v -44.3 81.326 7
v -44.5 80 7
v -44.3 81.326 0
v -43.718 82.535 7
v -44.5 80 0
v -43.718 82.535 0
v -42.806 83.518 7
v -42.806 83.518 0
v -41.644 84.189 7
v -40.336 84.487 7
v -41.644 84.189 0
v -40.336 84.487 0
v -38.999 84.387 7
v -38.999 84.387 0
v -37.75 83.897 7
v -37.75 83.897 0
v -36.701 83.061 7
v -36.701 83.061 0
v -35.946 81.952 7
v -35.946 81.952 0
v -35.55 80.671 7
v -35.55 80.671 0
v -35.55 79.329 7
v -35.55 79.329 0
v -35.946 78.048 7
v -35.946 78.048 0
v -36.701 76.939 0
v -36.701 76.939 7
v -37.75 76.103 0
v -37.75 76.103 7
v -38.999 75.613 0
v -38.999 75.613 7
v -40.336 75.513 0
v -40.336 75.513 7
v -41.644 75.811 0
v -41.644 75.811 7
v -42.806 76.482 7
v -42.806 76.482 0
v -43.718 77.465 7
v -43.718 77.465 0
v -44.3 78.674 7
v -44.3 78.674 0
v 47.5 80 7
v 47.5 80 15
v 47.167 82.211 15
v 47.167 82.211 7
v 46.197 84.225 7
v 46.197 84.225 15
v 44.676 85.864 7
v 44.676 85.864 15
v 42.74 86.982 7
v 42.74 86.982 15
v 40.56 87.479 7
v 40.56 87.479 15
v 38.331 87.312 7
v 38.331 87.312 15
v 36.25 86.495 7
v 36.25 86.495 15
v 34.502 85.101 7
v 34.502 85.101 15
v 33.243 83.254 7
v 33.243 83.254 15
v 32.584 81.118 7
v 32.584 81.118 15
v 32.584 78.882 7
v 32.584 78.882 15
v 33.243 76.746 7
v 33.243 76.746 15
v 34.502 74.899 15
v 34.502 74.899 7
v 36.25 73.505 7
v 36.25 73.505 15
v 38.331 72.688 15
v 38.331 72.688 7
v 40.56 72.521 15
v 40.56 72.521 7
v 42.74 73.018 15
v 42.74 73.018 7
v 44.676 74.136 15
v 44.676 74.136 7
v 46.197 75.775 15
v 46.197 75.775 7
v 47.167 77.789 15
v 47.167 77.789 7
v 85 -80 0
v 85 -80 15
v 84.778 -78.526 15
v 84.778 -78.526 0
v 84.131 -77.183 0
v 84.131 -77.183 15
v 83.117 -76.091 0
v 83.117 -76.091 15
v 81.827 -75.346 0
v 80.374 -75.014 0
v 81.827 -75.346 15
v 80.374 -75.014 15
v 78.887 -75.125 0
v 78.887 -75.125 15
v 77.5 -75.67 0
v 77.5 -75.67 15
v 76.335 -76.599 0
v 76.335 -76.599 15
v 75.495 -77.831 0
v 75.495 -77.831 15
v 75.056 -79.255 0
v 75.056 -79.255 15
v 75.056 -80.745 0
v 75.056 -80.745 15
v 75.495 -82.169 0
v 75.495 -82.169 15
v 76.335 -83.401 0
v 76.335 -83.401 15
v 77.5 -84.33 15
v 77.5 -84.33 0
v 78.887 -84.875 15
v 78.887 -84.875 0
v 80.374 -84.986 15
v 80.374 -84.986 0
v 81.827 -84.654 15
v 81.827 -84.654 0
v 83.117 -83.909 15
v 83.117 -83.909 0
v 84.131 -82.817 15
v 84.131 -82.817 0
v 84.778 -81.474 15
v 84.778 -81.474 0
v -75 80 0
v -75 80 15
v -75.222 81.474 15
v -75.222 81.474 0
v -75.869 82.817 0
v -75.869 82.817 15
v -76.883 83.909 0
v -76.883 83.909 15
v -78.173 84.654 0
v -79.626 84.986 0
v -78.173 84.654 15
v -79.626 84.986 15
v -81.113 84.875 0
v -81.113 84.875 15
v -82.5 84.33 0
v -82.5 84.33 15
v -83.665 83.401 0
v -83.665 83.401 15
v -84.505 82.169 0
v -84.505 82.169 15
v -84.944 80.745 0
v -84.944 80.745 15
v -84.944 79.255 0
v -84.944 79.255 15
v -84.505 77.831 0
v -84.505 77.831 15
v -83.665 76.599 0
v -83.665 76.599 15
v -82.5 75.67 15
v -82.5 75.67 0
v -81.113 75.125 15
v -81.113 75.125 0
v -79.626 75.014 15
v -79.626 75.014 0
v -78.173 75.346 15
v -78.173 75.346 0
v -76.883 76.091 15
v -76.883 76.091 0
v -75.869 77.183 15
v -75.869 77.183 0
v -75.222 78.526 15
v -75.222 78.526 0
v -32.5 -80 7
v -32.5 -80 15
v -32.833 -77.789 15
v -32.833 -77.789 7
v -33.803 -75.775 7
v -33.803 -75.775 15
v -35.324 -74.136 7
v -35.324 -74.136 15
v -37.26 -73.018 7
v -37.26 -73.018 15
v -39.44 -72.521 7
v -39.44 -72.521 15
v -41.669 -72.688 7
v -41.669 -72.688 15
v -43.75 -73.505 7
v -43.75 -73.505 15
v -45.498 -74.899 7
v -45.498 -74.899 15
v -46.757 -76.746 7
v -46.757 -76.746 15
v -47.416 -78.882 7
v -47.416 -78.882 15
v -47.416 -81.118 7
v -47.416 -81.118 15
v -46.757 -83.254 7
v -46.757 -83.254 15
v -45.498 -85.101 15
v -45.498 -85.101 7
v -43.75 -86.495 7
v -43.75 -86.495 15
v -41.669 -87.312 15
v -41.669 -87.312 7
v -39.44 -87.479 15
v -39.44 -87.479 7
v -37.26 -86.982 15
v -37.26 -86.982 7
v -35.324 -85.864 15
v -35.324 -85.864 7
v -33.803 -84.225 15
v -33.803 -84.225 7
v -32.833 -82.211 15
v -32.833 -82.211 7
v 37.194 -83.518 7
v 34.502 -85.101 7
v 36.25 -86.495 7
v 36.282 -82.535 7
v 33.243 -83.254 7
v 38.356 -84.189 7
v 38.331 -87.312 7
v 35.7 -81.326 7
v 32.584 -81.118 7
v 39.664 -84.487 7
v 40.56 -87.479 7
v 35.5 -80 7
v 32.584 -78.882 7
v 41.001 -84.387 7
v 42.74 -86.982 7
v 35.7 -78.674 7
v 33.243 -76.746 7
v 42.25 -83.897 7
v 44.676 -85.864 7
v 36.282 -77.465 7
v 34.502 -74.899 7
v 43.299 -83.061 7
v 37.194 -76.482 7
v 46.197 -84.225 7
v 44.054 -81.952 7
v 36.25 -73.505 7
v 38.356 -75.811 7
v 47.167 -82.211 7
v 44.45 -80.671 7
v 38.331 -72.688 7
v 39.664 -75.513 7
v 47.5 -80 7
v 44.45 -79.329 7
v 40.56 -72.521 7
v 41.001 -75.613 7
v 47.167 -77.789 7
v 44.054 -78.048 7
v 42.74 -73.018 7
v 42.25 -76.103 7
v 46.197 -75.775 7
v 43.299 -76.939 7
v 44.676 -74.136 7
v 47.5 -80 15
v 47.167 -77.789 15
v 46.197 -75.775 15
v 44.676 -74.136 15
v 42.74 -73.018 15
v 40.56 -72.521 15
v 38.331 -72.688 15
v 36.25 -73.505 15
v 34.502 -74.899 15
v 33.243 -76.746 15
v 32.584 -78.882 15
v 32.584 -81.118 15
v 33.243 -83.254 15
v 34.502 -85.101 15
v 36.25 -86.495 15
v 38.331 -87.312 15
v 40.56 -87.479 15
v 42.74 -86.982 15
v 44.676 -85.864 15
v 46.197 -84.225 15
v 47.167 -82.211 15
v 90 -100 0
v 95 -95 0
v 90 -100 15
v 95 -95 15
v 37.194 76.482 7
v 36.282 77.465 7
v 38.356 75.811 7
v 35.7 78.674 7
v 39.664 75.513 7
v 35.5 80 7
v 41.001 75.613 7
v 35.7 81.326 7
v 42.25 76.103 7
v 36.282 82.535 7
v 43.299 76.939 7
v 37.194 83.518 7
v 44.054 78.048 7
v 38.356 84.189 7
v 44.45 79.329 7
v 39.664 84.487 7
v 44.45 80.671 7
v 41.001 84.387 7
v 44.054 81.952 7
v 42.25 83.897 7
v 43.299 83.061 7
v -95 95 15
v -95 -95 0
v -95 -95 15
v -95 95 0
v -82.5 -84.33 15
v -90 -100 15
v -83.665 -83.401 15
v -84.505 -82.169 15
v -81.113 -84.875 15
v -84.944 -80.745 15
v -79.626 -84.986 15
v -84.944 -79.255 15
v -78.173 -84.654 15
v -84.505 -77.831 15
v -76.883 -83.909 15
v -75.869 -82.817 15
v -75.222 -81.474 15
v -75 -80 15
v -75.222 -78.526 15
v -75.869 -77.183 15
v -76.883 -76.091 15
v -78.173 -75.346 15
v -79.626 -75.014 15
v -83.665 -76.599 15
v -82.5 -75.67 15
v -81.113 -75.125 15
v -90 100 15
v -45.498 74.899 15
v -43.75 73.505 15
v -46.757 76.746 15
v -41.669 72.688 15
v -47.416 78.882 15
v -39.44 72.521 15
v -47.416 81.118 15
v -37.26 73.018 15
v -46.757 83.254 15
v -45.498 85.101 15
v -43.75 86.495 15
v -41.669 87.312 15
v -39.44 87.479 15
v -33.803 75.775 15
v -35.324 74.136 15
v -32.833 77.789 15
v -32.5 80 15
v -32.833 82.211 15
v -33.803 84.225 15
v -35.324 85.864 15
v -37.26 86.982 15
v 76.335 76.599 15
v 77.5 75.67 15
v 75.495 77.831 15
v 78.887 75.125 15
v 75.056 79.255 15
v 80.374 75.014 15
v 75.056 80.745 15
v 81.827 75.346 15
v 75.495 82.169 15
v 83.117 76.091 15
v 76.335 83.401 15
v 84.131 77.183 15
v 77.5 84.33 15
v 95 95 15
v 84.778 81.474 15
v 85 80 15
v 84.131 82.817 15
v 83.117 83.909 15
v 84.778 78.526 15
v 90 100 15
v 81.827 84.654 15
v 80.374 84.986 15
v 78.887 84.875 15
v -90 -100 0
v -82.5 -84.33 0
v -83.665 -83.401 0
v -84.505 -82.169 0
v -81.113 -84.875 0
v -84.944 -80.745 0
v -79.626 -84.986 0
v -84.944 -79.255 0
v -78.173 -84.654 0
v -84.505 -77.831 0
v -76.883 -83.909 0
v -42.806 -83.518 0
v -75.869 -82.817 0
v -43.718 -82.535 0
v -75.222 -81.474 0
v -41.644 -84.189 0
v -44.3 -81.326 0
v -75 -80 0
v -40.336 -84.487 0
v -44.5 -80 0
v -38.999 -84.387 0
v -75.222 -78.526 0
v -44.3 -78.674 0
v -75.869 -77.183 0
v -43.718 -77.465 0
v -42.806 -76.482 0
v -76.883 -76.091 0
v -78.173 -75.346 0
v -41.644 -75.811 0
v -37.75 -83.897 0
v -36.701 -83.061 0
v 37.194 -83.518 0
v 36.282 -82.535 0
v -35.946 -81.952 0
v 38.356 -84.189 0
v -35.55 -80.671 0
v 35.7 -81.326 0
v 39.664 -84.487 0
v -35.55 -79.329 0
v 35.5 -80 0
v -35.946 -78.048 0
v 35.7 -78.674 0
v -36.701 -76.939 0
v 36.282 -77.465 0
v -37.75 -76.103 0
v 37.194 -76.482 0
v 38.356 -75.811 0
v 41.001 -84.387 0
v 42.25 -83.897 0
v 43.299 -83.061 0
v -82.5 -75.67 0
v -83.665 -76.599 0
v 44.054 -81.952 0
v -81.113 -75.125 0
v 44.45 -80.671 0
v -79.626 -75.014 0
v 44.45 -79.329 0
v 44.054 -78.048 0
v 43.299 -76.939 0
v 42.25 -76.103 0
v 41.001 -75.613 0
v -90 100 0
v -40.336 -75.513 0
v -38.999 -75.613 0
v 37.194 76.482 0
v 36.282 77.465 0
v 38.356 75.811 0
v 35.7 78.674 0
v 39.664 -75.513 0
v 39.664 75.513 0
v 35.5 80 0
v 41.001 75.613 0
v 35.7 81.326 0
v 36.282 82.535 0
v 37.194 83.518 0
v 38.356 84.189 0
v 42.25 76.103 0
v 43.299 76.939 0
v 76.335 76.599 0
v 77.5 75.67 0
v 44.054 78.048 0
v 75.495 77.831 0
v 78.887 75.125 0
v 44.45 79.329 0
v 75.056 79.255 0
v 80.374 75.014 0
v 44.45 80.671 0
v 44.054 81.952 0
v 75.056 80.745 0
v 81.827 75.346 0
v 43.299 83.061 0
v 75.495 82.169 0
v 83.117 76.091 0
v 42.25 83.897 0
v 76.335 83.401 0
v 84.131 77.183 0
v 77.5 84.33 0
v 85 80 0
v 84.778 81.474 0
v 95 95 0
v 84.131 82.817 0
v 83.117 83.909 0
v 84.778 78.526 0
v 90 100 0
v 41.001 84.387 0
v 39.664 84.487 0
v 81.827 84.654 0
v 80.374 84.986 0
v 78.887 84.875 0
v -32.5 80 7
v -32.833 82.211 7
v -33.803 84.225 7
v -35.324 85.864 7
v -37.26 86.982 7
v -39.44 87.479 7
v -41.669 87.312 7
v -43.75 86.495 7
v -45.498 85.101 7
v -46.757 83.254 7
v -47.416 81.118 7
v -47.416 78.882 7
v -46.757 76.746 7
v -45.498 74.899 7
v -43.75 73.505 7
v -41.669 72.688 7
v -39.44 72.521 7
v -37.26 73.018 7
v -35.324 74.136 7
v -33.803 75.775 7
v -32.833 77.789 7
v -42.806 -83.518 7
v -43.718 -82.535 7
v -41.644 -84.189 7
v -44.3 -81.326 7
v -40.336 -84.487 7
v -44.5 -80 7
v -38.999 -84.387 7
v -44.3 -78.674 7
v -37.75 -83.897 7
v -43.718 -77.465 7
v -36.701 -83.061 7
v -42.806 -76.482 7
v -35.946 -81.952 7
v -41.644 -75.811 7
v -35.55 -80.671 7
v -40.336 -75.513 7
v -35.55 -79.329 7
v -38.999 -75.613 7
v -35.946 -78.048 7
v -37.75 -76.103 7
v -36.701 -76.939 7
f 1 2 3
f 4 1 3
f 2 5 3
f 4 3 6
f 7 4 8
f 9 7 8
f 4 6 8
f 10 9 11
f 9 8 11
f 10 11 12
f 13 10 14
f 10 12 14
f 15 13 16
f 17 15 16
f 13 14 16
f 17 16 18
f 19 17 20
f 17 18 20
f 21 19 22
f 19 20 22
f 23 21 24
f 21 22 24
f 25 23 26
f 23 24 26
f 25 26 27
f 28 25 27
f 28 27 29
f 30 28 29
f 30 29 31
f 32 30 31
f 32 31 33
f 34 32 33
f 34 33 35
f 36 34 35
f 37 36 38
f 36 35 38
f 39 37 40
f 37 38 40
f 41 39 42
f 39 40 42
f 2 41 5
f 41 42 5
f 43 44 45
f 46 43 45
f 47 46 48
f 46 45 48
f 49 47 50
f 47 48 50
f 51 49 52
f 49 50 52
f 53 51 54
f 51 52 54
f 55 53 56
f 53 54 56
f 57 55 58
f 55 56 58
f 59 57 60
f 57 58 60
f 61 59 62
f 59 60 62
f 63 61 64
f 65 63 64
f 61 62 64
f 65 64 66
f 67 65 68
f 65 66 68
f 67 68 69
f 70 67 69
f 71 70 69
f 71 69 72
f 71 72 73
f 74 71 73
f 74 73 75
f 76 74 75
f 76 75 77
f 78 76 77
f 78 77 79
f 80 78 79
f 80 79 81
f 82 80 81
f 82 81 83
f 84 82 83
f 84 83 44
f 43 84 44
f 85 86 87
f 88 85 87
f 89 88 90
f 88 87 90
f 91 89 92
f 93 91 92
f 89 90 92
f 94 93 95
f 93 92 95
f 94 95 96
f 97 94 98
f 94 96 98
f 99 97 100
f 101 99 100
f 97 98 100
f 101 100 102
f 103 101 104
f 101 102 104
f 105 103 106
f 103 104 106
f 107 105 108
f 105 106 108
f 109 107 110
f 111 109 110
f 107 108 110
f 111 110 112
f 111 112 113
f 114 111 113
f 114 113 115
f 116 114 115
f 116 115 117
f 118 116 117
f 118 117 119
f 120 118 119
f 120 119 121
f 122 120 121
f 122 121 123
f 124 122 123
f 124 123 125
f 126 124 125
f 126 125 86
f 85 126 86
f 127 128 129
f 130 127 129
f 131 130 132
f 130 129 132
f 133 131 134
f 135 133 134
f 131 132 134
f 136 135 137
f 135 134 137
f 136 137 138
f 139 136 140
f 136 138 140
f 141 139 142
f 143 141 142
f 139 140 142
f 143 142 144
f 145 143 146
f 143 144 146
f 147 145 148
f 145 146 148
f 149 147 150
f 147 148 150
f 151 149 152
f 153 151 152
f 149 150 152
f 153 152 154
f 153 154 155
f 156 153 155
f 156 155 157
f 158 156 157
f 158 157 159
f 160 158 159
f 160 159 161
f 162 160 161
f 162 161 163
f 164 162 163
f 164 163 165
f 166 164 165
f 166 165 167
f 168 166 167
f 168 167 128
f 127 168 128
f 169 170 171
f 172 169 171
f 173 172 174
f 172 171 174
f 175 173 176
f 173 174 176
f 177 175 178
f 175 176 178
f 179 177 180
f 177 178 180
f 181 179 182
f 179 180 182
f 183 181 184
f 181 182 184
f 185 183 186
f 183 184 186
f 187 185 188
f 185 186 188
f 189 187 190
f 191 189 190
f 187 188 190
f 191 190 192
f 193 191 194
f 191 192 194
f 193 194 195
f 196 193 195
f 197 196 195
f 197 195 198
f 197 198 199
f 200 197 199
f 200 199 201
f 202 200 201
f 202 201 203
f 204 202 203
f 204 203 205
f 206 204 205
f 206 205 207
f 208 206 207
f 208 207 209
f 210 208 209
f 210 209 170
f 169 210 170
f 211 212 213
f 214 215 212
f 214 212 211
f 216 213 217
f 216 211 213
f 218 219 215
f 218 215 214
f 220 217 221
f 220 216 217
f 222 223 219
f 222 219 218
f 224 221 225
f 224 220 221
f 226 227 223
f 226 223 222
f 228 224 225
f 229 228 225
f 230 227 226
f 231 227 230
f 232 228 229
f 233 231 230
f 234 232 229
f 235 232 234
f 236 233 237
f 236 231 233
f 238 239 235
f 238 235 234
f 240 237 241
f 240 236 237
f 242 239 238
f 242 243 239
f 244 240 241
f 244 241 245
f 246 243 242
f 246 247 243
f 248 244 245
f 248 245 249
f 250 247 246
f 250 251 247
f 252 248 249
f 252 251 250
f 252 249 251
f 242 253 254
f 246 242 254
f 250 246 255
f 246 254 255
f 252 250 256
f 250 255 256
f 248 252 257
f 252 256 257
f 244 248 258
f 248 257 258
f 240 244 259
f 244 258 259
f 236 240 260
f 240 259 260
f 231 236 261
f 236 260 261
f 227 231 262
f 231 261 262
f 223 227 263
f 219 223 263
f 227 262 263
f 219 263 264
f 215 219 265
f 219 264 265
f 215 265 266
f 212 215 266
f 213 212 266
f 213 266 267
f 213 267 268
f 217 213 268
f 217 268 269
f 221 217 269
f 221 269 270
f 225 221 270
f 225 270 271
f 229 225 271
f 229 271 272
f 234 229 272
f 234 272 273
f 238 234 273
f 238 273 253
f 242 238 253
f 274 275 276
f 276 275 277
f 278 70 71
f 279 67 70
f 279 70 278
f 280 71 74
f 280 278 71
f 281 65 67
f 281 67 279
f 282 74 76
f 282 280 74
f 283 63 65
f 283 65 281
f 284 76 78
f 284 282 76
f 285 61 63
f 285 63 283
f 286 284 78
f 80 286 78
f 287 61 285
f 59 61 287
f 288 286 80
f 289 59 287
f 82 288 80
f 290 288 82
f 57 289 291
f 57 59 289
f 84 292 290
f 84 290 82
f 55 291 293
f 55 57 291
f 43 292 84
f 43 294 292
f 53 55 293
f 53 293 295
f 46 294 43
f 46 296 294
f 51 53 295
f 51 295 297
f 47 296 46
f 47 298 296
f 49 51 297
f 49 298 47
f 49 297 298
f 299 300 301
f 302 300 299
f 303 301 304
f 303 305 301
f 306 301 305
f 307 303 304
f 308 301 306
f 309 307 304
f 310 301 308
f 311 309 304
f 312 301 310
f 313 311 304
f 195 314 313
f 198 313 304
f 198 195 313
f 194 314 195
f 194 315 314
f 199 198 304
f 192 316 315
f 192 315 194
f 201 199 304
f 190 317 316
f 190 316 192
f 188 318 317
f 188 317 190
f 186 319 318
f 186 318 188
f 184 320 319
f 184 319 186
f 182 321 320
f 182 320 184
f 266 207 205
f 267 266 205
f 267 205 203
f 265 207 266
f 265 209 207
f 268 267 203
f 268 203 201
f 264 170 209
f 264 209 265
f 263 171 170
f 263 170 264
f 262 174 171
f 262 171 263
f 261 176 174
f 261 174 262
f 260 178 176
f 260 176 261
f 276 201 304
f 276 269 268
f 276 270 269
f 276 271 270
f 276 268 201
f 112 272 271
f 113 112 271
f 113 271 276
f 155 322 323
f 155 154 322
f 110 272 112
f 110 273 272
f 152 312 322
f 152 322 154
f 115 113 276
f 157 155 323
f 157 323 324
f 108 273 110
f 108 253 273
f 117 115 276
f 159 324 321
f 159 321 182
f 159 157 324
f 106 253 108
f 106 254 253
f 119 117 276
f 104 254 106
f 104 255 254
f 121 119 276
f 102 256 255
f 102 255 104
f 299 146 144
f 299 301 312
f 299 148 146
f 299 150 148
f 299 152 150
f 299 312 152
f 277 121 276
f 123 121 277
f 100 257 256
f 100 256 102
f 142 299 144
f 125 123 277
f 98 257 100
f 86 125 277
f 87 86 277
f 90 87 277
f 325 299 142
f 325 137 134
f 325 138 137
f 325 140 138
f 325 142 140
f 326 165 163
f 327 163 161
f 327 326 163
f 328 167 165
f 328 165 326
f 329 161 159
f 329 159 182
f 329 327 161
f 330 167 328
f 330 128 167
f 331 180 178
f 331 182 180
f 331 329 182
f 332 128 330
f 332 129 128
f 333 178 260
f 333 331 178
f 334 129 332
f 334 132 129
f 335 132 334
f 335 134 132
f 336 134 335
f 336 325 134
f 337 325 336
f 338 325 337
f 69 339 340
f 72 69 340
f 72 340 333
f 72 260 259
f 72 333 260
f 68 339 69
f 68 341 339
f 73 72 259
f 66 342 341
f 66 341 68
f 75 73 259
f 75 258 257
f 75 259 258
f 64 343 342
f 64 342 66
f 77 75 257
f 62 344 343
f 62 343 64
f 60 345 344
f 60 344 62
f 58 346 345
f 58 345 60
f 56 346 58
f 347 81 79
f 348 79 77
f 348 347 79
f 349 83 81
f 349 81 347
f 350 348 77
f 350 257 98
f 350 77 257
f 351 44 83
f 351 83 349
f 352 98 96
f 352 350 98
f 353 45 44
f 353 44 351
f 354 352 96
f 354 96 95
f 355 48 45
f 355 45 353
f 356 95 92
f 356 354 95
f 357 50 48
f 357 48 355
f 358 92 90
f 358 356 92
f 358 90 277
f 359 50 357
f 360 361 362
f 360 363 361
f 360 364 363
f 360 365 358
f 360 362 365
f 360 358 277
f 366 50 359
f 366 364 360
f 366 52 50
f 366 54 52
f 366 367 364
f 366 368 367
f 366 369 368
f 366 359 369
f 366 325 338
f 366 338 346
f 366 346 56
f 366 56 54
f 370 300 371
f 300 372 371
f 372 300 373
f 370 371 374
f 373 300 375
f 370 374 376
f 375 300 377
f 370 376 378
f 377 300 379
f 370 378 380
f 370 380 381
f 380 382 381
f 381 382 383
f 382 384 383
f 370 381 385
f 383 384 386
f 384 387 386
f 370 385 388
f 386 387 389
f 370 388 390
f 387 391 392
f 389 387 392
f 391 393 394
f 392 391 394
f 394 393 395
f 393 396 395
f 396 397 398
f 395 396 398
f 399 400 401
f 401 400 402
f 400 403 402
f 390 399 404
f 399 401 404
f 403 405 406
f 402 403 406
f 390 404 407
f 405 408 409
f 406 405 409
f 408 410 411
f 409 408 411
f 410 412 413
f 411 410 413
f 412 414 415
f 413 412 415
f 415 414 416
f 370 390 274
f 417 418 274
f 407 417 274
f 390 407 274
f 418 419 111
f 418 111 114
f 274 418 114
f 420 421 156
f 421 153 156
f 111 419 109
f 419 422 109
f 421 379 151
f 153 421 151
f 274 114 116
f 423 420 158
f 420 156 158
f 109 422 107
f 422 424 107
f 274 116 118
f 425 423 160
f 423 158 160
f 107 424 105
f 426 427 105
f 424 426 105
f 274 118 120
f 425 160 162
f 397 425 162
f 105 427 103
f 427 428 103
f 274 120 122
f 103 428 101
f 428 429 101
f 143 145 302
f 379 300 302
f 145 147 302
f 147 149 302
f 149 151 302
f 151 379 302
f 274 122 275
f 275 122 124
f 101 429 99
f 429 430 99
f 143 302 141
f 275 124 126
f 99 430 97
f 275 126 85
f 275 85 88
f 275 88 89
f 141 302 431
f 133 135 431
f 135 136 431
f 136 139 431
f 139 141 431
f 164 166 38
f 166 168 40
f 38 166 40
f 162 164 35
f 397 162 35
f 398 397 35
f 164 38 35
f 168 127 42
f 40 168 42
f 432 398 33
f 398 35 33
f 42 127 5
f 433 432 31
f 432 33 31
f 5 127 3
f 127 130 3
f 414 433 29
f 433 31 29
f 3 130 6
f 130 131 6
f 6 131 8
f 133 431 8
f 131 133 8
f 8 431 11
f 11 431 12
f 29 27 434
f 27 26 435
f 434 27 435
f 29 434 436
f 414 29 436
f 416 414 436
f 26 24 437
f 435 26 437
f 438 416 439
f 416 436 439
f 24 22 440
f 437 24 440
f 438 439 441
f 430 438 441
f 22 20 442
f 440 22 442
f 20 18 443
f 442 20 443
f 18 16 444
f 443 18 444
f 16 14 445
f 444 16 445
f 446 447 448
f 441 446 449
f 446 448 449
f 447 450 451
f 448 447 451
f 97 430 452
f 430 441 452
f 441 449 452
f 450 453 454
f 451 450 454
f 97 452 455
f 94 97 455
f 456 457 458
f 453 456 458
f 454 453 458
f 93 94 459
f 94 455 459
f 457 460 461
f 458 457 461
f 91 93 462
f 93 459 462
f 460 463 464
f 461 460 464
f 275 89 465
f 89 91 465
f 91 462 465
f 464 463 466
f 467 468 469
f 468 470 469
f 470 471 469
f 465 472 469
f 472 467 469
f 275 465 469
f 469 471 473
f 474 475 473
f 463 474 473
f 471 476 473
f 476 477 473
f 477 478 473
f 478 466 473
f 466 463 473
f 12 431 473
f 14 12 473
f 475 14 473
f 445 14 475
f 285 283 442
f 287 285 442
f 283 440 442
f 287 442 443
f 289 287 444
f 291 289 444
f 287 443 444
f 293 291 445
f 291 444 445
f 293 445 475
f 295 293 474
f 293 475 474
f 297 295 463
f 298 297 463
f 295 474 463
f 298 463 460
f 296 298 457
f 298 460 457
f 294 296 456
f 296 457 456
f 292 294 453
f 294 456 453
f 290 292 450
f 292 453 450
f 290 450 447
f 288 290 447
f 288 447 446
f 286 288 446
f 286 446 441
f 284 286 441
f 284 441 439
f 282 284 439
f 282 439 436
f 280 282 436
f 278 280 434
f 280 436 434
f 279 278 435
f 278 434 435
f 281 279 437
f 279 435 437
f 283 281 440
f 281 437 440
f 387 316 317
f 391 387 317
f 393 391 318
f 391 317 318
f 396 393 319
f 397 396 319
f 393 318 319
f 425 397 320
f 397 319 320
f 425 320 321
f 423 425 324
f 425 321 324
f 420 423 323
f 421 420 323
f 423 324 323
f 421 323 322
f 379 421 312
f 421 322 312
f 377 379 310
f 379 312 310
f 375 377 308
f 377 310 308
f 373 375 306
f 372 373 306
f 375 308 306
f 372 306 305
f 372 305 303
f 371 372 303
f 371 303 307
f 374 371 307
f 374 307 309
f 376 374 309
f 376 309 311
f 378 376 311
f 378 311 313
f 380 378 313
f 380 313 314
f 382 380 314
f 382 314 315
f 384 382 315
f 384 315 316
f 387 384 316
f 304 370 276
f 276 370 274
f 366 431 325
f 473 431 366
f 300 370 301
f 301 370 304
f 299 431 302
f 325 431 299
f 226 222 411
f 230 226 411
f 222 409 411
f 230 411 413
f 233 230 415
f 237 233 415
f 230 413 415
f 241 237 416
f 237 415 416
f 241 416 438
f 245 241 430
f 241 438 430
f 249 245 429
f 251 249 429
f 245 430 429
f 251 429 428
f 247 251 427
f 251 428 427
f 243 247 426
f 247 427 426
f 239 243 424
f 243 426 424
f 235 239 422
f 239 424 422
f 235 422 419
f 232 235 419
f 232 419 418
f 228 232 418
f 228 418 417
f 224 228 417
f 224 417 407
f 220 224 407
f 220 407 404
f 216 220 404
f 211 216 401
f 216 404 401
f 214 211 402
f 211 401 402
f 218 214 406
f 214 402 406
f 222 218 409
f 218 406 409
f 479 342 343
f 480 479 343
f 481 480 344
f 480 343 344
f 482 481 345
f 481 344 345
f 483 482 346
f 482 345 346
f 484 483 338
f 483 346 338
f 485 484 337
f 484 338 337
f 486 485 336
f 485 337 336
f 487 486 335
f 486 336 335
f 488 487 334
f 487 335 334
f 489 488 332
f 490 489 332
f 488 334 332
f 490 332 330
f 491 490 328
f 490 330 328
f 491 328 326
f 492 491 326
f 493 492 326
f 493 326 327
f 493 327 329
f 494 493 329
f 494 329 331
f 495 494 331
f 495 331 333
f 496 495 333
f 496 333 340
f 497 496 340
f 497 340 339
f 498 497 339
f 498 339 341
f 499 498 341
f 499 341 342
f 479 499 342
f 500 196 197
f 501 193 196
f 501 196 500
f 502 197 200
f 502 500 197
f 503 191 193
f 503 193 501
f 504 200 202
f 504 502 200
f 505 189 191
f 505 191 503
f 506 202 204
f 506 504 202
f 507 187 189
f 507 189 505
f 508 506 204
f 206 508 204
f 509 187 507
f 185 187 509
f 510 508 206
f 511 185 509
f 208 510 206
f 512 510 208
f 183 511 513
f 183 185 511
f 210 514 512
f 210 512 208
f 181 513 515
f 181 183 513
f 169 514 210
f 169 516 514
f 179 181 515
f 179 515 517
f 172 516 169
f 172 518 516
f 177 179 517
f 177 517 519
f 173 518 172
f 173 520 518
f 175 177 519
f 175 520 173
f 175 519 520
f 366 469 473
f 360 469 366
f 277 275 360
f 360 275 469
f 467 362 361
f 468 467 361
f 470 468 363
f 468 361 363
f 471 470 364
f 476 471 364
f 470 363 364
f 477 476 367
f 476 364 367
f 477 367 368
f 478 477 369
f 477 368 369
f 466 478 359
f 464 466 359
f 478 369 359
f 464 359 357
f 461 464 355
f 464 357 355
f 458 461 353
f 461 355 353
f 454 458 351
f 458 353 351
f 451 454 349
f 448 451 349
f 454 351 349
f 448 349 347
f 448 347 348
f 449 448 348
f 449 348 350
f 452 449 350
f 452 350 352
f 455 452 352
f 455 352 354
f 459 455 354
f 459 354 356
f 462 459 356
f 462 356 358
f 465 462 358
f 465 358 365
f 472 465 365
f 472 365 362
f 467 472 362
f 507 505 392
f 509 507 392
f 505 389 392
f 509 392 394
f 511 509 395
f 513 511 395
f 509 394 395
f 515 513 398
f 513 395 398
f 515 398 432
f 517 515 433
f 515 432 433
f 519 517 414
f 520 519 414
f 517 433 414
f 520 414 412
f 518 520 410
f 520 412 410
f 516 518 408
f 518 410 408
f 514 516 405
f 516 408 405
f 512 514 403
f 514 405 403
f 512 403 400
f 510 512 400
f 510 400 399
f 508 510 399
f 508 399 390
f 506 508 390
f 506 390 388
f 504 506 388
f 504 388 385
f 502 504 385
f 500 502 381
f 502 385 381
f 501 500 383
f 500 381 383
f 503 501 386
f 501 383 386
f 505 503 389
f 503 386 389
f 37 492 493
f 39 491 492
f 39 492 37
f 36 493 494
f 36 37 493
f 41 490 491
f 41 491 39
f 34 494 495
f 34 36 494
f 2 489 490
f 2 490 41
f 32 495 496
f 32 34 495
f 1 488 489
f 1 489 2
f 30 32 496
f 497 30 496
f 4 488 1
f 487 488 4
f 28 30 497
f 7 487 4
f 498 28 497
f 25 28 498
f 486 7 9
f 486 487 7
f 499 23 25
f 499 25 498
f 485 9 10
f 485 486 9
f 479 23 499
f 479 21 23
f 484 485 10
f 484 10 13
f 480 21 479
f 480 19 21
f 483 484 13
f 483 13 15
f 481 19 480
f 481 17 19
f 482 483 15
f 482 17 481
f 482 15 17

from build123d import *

# Parameters (mm, degrees)
CROQUIS1_W                                           = 190
CROQUIS1_H                                           = 200
SALIENTE_EXTRUIR1_DEPTH                              = 15
CROQUIS2_R                                           = 4
CORTAR_EXTRUIR1_DEPTH                                = 139.744369255
CROQUIS3_R                                           = 5
CORTAR_EXTRUIR2_DEPTH                                = 139.744369255
CHAFL_N1_SIZE                                        = 5
REFRENTADO_PARA_TORNILLO_TAP_N_CON_CABEZ_D           = 9
REFRENTADO_PARA_TORNILLO_TAP_N_CON_CABEZ_CBORE_D     = 15
REFRENTADO_PARA_TORNILLO_TAP_N_CON_CABEZ_CBORE_DEPTH = 8


with BuildPart() as part:
    # Croquis1 → Saliente-Extruir1 (new body)
    with BuildSketch(Plane.XY):
        Rectangle(CROQUIS1_W, CROQUIS1_H)
    extrude(amount=SALIENTE_EXTRUIR1_DEPTH)

    # Croquis2 → Cortar-Extruir1 (cut, through all)
    with BuildSketch(Plane.XY.offset(15)):
        with Locations((-40, 80)):
            Circle(CROQUIS2_R)
        with Locations((40, 80)):
            Circle(CROQUIS2_R)
        with Locations((40, -80)):
            Circle(CROQUIS2_R)
        with Locations((-40, -80)):
            Circle(CROQUIS2_R)
    extrude(amount=-CORTAR_EXTRUIR1_DEPTH, mode=Mode.SUBTRACT)

    # Croquis3 → Cortar-Extruir2 (cut, through all)
    with BuildSketch(Plane.XY.offset(15)):
        with Locations((-80, 80)):
            Circle(CROQUIS3_R)
        with Locations((80, 80)):
            Circle(CROQUIS3_R)
        with Locations((80, -80)):
            Circle(CROQUIS3_R)
        with Locations((-80, -80)):
            Circle(CROQUIS3_R)
    extrude(amount=-CORTAR_EXTRUIR2_DEPTH, mode=Mode.SUBTRACT)

    # Chaflán1
    chafl_n1_edges = [part.edges().sort_by_distance(p)[0] for p in [
        (95, -100, 7.5),
        (-95, -100, 7.5),
        (-95, 100, 7.5),
        (95, 100, 7.5),
    ]]
    chamfer(chafl_n1_edges, length=CHAFL_N1_SIZE)

    # Refrentado para tornillo tapón con cabeza de clavija de M81 (through all)
    with Locations(Plane.XY.offset(15)):
        with Locations((40, 80), (-40, 80), (-40, -80), (40, -80)):
            CounterBoreHole(REFRENTADO_PARA_TORNILLO_TAP_N_CON_CABEZ_D / 2, REFRENTADO_PARA_TORNILLO_TAP_N_CON_CABEZ_CBORE_D / 2, REFRENTADO_PARA_TORNILLO_TAP_N_CON_CABEZ_CBORE_DEPTH)


solid = part.part
